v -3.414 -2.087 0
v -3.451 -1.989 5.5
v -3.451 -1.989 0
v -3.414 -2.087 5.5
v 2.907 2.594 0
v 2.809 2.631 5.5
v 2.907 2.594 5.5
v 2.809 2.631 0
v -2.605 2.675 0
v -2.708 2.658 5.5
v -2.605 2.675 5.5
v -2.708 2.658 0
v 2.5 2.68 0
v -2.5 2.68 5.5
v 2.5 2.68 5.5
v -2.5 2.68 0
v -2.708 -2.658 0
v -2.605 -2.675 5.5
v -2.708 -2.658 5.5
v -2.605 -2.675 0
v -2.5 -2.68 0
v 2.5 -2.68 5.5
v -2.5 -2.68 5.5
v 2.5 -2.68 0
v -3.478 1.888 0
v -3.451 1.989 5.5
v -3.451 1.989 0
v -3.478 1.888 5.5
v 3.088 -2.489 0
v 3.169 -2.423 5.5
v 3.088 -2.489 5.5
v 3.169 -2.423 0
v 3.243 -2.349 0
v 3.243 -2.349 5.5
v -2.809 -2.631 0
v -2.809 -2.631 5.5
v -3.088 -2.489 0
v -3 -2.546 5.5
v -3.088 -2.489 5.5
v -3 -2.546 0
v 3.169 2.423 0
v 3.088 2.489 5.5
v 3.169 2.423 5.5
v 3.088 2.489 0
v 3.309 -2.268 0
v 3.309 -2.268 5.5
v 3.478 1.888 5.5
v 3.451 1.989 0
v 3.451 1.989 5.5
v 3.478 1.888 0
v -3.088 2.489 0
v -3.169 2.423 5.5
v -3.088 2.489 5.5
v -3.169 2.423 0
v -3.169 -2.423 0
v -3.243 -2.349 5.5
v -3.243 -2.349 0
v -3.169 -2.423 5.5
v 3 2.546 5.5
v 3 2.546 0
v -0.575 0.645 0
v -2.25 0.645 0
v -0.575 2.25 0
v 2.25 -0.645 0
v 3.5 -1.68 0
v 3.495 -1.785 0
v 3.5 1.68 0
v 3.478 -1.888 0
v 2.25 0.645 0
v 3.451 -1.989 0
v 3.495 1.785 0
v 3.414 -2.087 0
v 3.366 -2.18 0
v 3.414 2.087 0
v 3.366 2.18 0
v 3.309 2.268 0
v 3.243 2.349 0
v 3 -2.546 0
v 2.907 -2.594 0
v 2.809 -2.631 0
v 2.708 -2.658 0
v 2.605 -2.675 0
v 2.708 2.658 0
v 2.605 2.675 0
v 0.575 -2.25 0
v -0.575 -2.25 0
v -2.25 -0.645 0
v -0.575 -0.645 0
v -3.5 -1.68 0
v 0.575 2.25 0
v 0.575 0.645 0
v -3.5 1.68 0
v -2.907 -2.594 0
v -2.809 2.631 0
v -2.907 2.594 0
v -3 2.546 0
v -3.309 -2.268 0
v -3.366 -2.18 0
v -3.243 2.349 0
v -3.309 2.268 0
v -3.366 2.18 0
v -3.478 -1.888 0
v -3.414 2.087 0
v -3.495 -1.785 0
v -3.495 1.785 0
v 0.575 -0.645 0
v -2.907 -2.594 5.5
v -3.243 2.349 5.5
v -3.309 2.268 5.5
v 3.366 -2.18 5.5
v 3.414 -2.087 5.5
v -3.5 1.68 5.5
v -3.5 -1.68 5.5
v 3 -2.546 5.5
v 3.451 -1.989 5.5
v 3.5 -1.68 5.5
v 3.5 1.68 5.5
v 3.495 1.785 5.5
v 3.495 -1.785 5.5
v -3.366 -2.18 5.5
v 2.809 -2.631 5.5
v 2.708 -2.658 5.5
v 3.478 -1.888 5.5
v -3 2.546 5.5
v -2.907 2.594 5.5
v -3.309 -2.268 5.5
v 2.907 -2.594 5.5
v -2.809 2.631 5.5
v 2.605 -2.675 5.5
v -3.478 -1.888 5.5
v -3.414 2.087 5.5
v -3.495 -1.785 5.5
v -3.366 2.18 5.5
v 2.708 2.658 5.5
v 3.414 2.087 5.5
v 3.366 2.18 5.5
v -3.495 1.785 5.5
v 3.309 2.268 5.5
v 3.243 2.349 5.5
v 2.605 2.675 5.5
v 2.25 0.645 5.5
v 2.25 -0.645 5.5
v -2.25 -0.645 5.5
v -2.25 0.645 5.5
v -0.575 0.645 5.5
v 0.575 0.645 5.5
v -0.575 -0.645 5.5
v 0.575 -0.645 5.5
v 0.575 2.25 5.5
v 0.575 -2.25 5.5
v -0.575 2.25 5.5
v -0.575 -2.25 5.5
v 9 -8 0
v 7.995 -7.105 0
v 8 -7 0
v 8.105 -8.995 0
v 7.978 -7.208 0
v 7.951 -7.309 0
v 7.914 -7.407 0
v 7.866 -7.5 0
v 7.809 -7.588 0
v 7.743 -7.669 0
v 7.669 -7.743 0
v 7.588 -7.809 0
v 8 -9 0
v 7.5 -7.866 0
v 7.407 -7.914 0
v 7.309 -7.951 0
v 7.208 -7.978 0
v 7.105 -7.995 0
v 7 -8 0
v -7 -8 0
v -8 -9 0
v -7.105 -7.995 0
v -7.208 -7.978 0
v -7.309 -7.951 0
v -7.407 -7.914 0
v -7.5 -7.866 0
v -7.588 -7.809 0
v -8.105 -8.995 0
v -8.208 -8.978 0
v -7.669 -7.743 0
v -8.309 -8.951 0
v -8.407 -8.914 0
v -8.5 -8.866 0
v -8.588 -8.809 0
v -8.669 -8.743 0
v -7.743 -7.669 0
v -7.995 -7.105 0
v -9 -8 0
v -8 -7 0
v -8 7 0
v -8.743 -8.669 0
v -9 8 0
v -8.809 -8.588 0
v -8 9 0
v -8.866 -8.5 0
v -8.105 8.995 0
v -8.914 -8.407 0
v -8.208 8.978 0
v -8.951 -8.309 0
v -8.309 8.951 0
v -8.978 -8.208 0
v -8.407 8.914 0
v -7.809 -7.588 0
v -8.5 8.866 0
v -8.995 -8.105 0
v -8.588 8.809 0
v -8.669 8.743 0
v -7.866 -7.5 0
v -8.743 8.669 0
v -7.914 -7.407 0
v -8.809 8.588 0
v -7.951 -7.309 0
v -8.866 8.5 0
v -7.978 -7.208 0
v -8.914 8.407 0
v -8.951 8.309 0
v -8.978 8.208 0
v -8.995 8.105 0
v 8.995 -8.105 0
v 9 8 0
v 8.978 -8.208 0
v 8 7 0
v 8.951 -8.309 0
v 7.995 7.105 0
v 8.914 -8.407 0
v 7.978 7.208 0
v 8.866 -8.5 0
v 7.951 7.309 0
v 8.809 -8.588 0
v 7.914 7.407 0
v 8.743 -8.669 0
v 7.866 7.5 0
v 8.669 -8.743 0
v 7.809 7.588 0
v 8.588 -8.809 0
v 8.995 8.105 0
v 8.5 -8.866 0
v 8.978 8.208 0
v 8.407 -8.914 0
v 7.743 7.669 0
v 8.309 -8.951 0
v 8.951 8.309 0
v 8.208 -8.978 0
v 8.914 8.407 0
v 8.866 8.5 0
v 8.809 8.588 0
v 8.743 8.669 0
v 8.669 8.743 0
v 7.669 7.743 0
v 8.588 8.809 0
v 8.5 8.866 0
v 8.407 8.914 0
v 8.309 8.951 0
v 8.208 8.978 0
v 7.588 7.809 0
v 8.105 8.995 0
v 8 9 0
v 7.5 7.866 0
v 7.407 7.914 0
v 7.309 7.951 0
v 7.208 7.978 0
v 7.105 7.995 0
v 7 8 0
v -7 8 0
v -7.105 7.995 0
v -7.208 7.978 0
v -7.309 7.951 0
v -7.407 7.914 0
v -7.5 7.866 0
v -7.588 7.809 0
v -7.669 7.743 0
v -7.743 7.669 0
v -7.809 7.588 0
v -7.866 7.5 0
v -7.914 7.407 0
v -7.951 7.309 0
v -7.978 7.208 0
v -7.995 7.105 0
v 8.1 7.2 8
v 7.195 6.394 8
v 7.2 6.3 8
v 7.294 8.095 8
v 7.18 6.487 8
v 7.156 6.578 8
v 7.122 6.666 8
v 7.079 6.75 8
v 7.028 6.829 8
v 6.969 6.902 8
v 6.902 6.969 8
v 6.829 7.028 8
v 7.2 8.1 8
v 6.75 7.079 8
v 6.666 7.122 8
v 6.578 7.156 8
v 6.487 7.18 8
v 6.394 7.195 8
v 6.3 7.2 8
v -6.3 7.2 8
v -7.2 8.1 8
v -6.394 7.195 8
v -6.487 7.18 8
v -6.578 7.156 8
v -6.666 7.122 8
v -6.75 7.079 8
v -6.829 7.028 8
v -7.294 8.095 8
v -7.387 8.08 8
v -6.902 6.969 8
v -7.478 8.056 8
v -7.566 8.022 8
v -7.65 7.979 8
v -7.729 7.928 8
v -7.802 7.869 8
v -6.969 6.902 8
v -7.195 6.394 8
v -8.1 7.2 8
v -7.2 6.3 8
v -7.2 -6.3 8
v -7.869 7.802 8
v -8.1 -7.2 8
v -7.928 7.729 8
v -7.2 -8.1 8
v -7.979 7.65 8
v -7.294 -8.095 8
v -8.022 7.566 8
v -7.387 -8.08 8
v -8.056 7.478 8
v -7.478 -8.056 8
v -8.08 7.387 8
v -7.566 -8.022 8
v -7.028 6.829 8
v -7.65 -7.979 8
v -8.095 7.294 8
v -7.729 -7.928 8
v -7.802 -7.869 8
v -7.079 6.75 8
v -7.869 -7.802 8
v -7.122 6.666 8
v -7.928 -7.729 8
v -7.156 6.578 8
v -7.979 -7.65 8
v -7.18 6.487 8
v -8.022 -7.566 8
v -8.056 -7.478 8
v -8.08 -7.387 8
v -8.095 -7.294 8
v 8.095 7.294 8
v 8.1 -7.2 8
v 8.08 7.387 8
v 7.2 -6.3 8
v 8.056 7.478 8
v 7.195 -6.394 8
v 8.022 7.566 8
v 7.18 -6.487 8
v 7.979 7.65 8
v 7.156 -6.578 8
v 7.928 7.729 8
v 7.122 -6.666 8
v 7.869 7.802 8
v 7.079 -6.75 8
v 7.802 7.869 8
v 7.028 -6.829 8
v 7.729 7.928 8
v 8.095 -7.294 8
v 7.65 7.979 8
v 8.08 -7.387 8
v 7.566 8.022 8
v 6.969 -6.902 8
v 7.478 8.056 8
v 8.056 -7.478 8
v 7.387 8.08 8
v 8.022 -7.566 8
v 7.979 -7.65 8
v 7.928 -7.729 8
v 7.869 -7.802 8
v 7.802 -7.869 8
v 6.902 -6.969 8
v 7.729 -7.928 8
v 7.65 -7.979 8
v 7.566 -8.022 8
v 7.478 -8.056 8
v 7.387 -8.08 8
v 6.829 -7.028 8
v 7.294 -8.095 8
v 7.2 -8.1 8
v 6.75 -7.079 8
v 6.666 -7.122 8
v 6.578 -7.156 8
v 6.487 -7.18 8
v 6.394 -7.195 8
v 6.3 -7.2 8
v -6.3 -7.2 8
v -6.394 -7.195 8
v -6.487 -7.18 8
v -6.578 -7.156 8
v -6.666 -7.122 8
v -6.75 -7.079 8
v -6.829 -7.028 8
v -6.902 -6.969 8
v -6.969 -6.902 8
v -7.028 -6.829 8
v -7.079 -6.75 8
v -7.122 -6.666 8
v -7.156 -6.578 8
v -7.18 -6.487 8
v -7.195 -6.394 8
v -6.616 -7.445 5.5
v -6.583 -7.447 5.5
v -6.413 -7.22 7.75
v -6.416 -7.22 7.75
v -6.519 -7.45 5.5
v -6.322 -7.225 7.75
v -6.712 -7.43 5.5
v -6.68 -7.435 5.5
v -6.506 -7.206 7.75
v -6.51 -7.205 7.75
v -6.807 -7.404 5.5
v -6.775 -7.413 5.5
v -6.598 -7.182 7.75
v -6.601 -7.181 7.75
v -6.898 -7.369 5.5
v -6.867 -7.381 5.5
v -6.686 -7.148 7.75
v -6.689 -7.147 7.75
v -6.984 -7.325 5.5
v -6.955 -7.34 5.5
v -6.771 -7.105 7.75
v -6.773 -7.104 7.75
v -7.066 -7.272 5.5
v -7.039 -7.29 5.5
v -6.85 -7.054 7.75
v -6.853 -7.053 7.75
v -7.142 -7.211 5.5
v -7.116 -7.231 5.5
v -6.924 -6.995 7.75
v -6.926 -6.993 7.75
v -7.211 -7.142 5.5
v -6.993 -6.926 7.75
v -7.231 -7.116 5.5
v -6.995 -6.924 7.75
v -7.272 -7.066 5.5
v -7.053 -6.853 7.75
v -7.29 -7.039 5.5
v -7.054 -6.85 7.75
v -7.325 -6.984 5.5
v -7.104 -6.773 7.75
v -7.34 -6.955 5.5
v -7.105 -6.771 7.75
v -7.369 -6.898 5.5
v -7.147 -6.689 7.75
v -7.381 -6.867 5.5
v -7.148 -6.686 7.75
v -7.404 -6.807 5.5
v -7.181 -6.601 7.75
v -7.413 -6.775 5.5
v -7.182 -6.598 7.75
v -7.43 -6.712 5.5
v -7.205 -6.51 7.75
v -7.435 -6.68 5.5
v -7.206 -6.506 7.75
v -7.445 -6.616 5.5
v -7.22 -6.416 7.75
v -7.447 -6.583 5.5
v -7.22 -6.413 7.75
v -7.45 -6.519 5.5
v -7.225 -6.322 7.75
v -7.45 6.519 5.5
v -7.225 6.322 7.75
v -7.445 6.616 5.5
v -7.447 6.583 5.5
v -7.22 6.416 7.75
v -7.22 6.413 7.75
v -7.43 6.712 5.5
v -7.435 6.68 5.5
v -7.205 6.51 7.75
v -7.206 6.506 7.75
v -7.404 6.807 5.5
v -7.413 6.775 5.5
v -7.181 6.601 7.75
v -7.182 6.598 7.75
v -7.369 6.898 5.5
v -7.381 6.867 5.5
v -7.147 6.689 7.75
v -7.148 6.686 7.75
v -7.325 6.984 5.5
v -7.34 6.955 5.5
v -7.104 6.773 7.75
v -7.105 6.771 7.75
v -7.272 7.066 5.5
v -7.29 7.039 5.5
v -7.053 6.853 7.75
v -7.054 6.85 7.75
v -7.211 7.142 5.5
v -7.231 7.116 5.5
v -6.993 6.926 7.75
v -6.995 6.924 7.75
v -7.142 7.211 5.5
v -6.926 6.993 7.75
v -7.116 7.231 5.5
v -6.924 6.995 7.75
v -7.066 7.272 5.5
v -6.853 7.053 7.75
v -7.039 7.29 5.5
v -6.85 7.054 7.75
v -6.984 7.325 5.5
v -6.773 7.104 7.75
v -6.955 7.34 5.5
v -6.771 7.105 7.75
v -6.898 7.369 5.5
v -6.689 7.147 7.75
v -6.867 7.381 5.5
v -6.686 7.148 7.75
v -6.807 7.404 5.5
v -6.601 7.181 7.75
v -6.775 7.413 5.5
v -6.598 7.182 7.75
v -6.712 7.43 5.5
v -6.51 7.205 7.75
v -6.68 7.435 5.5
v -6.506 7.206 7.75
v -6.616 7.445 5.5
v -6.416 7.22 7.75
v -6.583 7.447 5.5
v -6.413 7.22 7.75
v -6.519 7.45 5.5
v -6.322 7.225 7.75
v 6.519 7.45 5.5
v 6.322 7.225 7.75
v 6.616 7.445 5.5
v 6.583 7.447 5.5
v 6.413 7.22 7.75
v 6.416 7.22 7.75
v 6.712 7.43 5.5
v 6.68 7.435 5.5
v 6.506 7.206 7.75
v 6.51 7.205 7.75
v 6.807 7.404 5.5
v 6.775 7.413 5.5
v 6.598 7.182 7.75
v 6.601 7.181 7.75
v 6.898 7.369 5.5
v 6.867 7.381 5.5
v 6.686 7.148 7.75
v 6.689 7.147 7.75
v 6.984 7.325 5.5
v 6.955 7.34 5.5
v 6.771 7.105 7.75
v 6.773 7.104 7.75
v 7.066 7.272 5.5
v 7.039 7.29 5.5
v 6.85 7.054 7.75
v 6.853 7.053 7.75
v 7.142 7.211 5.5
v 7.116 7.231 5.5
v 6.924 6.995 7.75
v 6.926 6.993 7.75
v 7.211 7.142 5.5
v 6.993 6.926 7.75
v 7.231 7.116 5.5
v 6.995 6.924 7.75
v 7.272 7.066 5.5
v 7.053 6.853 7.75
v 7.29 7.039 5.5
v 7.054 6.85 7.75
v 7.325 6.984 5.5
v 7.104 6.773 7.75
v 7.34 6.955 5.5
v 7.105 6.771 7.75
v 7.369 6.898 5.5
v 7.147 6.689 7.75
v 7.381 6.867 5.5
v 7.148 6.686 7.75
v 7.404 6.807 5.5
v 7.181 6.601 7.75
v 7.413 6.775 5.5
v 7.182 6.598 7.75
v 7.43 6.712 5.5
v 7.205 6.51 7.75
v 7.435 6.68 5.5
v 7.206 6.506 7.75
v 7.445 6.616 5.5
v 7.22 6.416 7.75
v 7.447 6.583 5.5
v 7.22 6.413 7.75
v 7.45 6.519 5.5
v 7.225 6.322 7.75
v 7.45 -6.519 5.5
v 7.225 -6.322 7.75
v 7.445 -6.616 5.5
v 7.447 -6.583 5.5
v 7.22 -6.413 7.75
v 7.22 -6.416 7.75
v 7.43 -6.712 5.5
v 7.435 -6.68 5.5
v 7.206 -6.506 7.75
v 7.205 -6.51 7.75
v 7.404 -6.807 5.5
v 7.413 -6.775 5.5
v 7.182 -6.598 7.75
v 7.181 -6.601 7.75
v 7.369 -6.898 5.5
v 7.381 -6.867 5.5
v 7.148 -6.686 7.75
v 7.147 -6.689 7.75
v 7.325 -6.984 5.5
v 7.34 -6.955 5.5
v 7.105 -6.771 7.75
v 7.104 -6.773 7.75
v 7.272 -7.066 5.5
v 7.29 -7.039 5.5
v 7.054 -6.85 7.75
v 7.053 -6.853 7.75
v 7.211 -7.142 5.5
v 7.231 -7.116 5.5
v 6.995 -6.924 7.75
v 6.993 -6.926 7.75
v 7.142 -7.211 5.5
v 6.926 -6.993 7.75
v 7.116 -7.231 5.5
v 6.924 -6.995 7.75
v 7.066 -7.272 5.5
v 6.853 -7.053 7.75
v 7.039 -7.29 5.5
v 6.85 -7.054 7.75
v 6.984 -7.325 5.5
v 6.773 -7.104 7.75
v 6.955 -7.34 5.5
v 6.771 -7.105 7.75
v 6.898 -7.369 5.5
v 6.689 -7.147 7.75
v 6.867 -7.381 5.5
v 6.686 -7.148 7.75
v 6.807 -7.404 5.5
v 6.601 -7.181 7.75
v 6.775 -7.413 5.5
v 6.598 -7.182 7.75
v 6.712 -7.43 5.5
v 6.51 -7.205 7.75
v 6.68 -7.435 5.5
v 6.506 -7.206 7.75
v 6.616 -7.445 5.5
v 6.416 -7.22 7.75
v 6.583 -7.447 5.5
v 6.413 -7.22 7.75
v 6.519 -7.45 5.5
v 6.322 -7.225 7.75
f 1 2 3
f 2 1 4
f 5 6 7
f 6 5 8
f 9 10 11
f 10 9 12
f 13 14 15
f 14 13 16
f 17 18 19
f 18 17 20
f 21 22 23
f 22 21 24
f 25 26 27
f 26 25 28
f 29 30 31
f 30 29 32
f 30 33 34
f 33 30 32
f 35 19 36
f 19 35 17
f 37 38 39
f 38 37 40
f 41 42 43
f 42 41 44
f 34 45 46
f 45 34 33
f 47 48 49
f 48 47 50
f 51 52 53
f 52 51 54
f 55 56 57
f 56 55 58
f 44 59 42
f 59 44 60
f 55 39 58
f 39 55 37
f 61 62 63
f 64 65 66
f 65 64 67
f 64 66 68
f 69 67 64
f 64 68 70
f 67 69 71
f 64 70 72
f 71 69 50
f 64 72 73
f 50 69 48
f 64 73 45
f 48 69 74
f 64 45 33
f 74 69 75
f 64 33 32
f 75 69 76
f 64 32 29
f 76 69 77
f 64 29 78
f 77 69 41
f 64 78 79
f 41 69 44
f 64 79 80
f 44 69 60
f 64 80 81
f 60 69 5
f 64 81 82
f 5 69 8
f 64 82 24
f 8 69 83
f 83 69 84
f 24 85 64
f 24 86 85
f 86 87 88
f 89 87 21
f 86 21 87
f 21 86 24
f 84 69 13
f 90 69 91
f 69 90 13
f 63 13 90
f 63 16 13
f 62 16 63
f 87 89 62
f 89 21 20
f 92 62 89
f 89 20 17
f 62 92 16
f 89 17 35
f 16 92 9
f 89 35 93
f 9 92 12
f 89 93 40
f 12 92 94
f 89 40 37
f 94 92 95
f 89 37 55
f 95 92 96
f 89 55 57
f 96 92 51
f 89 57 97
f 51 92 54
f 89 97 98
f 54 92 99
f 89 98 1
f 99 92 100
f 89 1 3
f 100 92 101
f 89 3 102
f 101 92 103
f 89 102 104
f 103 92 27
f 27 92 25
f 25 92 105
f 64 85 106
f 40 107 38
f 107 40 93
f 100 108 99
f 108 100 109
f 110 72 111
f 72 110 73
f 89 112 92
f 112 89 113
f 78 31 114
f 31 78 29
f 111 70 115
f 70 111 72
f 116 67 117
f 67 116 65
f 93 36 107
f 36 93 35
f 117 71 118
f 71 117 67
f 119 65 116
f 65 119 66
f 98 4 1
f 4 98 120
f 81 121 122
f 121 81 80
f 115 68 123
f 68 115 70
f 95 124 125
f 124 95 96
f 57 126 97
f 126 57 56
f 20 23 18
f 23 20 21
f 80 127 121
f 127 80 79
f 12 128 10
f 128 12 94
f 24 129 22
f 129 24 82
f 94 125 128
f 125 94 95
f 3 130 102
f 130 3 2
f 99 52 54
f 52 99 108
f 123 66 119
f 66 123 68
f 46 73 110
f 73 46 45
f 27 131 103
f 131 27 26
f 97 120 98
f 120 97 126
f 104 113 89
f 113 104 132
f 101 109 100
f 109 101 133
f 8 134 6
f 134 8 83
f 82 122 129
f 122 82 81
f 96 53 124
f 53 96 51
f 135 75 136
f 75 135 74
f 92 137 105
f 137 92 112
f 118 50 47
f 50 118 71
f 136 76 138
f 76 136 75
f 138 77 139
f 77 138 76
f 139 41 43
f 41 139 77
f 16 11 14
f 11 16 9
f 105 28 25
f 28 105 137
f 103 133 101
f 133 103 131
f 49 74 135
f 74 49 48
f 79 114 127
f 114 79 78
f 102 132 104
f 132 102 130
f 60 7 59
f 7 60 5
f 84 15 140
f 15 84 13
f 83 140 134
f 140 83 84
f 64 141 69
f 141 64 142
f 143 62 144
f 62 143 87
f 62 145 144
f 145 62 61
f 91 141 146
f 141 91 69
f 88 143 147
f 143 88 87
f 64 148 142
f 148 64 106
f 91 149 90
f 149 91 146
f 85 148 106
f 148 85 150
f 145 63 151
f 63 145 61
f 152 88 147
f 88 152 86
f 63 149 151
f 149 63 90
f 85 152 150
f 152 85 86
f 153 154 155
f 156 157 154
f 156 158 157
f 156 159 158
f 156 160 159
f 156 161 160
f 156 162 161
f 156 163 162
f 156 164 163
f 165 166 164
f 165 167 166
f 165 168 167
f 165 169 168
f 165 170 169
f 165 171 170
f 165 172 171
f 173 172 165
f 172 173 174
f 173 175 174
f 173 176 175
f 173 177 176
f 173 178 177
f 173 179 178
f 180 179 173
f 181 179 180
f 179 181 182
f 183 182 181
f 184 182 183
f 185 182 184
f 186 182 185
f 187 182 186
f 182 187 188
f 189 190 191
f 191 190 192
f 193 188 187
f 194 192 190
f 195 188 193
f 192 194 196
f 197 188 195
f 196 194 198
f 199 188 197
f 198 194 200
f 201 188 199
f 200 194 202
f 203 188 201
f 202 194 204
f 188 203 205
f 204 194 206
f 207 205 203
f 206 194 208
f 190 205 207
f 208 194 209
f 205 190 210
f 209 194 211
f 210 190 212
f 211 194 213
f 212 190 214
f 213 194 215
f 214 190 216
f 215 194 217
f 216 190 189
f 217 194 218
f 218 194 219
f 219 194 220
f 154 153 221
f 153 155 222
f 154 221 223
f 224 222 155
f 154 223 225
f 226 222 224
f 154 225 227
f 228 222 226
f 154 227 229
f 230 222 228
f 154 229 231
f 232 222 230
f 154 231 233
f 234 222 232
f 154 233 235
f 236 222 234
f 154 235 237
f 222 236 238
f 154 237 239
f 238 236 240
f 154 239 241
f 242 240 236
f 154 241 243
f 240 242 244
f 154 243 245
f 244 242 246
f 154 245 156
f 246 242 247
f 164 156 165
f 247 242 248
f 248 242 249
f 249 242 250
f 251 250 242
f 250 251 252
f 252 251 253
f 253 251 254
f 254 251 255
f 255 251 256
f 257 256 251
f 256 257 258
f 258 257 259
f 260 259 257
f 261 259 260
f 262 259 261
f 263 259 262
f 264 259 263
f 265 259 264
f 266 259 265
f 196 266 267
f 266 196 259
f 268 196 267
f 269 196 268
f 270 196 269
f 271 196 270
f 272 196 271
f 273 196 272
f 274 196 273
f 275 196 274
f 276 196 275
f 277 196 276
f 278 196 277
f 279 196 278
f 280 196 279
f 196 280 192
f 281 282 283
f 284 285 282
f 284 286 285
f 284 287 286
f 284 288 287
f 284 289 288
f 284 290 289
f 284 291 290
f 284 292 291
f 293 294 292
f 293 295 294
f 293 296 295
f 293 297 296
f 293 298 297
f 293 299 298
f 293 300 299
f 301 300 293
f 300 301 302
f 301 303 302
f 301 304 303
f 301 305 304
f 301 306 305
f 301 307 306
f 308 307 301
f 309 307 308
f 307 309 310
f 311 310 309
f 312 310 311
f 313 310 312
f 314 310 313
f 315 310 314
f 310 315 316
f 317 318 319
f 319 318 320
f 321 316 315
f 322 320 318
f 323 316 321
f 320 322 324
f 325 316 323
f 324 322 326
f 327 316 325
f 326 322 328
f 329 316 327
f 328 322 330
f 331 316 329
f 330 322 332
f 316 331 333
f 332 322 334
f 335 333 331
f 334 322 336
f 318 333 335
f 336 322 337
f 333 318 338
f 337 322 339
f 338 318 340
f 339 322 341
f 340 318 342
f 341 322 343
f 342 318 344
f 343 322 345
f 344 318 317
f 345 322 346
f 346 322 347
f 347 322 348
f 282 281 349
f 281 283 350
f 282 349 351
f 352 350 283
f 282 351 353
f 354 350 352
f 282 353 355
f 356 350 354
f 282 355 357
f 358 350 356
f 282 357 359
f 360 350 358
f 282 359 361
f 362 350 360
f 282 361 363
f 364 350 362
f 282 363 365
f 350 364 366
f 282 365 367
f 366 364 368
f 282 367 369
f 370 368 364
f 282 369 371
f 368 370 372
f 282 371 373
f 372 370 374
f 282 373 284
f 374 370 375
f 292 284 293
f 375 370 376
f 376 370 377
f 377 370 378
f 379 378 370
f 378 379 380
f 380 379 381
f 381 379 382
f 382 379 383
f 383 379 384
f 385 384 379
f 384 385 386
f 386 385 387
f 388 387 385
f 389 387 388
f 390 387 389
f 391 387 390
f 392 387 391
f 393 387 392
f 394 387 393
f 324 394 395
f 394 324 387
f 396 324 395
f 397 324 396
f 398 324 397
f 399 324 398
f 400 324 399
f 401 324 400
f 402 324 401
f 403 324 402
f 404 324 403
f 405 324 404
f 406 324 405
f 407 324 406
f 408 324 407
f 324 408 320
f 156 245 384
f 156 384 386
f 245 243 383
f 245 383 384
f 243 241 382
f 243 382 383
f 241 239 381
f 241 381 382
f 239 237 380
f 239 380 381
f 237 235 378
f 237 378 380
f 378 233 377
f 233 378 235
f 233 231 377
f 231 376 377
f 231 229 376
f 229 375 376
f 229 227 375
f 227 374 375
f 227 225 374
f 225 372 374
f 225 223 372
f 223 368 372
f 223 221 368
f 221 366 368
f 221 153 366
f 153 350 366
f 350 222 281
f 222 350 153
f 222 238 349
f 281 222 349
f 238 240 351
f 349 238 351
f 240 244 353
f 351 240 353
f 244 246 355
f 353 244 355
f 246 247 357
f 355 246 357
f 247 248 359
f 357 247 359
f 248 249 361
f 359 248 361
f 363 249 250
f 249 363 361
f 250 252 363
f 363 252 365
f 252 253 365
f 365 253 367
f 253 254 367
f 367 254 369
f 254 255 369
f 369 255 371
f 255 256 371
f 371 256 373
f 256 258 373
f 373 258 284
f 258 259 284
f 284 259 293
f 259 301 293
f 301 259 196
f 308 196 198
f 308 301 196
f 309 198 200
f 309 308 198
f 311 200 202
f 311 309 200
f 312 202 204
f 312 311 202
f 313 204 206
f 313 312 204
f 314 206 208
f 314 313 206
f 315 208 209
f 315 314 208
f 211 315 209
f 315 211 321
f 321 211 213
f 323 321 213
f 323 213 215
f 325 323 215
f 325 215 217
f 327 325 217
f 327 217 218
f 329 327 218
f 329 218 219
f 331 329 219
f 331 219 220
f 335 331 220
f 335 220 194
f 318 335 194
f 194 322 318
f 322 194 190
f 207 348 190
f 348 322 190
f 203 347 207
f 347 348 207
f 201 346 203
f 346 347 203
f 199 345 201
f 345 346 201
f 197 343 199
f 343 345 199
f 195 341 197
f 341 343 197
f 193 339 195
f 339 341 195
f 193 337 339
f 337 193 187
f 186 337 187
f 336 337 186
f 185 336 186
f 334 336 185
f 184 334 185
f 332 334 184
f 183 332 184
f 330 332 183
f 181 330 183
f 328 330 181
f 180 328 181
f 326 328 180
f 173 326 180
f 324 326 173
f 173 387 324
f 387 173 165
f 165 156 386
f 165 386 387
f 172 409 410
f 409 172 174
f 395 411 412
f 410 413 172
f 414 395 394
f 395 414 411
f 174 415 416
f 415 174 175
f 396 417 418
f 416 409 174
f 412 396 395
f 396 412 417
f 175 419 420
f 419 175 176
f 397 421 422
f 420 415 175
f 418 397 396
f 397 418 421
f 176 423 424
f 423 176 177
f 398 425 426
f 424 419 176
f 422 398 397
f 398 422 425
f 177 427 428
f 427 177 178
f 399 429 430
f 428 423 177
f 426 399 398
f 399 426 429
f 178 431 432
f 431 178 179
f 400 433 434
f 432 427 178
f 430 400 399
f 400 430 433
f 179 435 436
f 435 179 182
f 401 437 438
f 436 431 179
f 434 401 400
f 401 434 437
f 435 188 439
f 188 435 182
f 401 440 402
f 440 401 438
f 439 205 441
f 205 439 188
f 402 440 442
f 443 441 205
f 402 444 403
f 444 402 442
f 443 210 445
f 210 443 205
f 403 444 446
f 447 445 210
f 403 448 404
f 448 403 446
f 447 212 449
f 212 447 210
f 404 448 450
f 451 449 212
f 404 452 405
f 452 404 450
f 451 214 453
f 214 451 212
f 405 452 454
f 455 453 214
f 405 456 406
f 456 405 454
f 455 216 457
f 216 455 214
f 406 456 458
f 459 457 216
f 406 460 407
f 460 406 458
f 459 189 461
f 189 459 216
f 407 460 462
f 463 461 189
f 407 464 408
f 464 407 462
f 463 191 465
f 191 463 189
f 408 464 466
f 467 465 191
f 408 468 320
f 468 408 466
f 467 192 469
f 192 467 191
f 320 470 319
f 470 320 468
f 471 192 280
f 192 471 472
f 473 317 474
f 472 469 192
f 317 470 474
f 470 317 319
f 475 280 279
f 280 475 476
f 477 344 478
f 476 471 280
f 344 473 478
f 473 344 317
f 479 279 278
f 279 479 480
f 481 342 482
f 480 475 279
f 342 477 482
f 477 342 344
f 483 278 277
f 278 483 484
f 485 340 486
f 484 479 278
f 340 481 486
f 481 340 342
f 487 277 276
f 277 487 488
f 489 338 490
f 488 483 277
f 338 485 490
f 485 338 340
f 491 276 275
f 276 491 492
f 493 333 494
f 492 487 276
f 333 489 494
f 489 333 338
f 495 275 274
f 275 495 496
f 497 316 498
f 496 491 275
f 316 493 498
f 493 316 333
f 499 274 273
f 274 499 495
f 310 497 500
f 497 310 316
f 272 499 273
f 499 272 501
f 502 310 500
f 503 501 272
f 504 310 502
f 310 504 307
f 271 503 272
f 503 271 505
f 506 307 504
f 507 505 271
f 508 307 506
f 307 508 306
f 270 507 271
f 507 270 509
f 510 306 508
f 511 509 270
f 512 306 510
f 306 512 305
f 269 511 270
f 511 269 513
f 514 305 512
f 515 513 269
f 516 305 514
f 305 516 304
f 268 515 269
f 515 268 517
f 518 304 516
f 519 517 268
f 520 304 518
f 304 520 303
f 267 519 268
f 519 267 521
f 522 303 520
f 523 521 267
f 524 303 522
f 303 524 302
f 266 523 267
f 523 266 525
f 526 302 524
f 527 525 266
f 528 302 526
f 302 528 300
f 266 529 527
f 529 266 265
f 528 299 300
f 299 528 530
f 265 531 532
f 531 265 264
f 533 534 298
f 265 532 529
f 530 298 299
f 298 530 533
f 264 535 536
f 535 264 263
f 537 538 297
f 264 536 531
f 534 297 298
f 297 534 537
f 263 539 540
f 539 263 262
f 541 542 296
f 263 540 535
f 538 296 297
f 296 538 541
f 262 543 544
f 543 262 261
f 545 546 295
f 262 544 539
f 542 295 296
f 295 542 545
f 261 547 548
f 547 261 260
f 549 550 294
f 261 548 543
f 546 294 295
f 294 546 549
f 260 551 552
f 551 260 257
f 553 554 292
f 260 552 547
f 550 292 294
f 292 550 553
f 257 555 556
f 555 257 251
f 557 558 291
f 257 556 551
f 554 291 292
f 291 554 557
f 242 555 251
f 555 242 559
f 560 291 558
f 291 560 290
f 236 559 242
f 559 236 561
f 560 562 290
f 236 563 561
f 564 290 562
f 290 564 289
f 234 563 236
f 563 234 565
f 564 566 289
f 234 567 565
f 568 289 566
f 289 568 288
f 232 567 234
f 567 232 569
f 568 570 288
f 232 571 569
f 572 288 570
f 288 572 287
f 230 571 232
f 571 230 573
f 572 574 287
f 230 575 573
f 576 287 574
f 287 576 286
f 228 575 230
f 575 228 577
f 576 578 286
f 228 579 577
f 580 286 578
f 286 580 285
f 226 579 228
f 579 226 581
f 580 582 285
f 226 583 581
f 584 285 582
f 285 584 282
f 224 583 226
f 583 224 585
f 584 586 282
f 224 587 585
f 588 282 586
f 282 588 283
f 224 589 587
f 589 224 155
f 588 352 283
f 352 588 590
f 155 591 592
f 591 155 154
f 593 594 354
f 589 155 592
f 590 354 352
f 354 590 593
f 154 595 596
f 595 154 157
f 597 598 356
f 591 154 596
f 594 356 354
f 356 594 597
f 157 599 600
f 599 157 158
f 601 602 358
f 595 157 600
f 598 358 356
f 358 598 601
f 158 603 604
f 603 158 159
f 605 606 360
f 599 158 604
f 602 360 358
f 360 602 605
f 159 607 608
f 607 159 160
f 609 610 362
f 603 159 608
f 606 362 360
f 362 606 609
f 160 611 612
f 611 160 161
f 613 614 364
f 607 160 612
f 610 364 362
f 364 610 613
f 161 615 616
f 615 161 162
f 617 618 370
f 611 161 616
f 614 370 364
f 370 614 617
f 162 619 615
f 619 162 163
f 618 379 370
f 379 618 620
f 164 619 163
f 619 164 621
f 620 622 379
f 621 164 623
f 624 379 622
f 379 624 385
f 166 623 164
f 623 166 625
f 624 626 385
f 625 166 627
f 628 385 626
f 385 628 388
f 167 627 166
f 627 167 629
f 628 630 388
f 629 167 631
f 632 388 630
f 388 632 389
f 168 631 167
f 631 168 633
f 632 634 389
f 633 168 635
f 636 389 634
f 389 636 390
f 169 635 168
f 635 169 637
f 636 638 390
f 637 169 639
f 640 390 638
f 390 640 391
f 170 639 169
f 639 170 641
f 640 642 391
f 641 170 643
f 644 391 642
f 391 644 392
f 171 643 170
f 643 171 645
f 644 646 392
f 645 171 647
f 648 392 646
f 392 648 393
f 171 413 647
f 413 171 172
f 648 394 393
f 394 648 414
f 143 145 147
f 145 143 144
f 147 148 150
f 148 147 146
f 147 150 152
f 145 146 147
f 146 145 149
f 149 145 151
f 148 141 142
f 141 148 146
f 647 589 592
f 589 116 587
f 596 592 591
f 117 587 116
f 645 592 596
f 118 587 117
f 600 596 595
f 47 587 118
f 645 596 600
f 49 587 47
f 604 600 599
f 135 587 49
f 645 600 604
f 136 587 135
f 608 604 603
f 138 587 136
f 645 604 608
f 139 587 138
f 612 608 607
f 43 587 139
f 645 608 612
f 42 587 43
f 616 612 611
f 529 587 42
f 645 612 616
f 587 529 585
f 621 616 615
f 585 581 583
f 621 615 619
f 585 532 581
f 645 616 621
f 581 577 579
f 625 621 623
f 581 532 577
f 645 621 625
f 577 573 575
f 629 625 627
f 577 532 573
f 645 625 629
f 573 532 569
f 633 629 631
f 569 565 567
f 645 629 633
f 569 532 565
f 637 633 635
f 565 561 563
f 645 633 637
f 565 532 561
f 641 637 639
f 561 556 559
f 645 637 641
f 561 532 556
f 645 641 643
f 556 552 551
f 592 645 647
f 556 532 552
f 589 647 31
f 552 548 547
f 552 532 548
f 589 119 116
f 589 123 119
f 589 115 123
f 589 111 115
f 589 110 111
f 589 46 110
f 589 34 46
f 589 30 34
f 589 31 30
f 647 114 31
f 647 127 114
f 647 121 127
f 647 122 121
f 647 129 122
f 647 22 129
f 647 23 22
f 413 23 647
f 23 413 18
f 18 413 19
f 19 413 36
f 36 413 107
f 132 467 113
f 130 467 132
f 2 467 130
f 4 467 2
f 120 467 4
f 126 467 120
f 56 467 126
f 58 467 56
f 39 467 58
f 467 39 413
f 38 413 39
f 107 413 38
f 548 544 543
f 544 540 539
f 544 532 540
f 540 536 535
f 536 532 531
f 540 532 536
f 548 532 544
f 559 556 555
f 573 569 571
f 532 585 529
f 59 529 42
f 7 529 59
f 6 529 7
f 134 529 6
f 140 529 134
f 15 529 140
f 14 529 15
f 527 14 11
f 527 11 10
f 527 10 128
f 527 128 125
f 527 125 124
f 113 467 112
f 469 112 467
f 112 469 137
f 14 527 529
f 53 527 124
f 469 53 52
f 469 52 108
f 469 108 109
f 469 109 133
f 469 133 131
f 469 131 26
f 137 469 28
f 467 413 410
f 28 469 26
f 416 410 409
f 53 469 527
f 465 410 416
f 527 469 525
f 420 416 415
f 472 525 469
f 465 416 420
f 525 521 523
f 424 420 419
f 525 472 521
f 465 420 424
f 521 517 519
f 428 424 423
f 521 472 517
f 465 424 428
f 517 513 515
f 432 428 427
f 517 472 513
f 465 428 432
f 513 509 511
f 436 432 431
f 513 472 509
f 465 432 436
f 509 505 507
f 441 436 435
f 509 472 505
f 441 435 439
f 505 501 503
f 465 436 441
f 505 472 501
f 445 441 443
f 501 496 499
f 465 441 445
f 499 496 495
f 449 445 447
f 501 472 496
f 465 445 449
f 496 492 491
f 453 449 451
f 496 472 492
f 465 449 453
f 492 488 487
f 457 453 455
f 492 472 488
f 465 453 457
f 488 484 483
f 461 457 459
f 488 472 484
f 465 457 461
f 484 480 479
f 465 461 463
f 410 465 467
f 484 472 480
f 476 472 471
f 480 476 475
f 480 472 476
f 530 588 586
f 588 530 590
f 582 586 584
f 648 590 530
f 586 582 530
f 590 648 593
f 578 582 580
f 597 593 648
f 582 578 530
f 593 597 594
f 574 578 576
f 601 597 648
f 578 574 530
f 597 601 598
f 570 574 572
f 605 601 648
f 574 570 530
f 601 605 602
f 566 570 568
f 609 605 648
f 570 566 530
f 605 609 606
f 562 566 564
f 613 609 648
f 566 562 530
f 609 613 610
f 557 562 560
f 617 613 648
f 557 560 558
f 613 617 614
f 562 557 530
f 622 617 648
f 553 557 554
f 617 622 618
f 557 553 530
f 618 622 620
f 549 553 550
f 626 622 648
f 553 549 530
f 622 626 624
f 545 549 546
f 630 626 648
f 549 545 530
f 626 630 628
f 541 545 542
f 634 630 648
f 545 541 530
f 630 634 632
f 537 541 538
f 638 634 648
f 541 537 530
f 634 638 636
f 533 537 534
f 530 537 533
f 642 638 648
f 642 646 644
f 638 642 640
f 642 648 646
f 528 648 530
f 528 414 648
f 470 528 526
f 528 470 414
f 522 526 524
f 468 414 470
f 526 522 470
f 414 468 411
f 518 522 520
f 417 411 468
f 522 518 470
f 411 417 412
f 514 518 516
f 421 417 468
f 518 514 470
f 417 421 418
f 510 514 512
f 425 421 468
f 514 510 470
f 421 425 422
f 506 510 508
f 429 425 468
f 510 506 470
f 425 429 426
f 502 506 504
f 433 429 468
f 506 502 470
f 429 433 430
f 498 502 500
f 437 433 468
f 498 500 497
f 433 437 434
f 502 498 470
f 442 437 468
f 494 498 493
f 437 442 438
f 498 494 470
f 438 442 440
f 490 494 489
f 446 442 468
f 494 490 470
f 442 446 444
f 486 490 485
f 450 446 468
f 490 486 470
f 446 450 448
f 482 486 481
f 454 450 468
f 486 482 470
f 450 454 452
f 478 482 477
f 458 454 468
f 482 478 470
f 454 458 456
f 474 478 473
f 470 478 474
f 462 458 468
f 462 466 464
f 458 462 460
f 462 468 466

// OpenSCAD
// Define higher resolution for transformations

$fn=60;

union() {
    // sides
    color("#FFA500")
    linear_extrude(height = 8, scale=0.90)
    difference() {
        offset(r=1) square(16, true);
        offset(r=1) square(14, true);
    }

    // top ceiling
    color("#FF8C00")
    translate([0,0,5.5])
        linear_extrude(height = 2.25)
        offset(r=1)
        square(13, true);

    // fitting support
    color("#FF7F50")
    translate([0, 0, 3.25])
    difference(){
        // housing fitting
        hull() {
            translate([2.50, 1.68, 0])   cylinder(6.5, 1, 1, true);
            translate([-2.50, 1.68, 0])  cylinder(6.5, 1, 1, true);
            translate([2.50, -1.68, 0])  cylinder(6.5, 1, 1, true);
            translate([-2.50, -1.68, 0]) cylinder(6.5, 1, 1, true);
        }
        // cross fitting cutoff
        cube([4.5, 1.29, 10], true);
        cube([1.15, 4.5, 10], true);
    }
}
